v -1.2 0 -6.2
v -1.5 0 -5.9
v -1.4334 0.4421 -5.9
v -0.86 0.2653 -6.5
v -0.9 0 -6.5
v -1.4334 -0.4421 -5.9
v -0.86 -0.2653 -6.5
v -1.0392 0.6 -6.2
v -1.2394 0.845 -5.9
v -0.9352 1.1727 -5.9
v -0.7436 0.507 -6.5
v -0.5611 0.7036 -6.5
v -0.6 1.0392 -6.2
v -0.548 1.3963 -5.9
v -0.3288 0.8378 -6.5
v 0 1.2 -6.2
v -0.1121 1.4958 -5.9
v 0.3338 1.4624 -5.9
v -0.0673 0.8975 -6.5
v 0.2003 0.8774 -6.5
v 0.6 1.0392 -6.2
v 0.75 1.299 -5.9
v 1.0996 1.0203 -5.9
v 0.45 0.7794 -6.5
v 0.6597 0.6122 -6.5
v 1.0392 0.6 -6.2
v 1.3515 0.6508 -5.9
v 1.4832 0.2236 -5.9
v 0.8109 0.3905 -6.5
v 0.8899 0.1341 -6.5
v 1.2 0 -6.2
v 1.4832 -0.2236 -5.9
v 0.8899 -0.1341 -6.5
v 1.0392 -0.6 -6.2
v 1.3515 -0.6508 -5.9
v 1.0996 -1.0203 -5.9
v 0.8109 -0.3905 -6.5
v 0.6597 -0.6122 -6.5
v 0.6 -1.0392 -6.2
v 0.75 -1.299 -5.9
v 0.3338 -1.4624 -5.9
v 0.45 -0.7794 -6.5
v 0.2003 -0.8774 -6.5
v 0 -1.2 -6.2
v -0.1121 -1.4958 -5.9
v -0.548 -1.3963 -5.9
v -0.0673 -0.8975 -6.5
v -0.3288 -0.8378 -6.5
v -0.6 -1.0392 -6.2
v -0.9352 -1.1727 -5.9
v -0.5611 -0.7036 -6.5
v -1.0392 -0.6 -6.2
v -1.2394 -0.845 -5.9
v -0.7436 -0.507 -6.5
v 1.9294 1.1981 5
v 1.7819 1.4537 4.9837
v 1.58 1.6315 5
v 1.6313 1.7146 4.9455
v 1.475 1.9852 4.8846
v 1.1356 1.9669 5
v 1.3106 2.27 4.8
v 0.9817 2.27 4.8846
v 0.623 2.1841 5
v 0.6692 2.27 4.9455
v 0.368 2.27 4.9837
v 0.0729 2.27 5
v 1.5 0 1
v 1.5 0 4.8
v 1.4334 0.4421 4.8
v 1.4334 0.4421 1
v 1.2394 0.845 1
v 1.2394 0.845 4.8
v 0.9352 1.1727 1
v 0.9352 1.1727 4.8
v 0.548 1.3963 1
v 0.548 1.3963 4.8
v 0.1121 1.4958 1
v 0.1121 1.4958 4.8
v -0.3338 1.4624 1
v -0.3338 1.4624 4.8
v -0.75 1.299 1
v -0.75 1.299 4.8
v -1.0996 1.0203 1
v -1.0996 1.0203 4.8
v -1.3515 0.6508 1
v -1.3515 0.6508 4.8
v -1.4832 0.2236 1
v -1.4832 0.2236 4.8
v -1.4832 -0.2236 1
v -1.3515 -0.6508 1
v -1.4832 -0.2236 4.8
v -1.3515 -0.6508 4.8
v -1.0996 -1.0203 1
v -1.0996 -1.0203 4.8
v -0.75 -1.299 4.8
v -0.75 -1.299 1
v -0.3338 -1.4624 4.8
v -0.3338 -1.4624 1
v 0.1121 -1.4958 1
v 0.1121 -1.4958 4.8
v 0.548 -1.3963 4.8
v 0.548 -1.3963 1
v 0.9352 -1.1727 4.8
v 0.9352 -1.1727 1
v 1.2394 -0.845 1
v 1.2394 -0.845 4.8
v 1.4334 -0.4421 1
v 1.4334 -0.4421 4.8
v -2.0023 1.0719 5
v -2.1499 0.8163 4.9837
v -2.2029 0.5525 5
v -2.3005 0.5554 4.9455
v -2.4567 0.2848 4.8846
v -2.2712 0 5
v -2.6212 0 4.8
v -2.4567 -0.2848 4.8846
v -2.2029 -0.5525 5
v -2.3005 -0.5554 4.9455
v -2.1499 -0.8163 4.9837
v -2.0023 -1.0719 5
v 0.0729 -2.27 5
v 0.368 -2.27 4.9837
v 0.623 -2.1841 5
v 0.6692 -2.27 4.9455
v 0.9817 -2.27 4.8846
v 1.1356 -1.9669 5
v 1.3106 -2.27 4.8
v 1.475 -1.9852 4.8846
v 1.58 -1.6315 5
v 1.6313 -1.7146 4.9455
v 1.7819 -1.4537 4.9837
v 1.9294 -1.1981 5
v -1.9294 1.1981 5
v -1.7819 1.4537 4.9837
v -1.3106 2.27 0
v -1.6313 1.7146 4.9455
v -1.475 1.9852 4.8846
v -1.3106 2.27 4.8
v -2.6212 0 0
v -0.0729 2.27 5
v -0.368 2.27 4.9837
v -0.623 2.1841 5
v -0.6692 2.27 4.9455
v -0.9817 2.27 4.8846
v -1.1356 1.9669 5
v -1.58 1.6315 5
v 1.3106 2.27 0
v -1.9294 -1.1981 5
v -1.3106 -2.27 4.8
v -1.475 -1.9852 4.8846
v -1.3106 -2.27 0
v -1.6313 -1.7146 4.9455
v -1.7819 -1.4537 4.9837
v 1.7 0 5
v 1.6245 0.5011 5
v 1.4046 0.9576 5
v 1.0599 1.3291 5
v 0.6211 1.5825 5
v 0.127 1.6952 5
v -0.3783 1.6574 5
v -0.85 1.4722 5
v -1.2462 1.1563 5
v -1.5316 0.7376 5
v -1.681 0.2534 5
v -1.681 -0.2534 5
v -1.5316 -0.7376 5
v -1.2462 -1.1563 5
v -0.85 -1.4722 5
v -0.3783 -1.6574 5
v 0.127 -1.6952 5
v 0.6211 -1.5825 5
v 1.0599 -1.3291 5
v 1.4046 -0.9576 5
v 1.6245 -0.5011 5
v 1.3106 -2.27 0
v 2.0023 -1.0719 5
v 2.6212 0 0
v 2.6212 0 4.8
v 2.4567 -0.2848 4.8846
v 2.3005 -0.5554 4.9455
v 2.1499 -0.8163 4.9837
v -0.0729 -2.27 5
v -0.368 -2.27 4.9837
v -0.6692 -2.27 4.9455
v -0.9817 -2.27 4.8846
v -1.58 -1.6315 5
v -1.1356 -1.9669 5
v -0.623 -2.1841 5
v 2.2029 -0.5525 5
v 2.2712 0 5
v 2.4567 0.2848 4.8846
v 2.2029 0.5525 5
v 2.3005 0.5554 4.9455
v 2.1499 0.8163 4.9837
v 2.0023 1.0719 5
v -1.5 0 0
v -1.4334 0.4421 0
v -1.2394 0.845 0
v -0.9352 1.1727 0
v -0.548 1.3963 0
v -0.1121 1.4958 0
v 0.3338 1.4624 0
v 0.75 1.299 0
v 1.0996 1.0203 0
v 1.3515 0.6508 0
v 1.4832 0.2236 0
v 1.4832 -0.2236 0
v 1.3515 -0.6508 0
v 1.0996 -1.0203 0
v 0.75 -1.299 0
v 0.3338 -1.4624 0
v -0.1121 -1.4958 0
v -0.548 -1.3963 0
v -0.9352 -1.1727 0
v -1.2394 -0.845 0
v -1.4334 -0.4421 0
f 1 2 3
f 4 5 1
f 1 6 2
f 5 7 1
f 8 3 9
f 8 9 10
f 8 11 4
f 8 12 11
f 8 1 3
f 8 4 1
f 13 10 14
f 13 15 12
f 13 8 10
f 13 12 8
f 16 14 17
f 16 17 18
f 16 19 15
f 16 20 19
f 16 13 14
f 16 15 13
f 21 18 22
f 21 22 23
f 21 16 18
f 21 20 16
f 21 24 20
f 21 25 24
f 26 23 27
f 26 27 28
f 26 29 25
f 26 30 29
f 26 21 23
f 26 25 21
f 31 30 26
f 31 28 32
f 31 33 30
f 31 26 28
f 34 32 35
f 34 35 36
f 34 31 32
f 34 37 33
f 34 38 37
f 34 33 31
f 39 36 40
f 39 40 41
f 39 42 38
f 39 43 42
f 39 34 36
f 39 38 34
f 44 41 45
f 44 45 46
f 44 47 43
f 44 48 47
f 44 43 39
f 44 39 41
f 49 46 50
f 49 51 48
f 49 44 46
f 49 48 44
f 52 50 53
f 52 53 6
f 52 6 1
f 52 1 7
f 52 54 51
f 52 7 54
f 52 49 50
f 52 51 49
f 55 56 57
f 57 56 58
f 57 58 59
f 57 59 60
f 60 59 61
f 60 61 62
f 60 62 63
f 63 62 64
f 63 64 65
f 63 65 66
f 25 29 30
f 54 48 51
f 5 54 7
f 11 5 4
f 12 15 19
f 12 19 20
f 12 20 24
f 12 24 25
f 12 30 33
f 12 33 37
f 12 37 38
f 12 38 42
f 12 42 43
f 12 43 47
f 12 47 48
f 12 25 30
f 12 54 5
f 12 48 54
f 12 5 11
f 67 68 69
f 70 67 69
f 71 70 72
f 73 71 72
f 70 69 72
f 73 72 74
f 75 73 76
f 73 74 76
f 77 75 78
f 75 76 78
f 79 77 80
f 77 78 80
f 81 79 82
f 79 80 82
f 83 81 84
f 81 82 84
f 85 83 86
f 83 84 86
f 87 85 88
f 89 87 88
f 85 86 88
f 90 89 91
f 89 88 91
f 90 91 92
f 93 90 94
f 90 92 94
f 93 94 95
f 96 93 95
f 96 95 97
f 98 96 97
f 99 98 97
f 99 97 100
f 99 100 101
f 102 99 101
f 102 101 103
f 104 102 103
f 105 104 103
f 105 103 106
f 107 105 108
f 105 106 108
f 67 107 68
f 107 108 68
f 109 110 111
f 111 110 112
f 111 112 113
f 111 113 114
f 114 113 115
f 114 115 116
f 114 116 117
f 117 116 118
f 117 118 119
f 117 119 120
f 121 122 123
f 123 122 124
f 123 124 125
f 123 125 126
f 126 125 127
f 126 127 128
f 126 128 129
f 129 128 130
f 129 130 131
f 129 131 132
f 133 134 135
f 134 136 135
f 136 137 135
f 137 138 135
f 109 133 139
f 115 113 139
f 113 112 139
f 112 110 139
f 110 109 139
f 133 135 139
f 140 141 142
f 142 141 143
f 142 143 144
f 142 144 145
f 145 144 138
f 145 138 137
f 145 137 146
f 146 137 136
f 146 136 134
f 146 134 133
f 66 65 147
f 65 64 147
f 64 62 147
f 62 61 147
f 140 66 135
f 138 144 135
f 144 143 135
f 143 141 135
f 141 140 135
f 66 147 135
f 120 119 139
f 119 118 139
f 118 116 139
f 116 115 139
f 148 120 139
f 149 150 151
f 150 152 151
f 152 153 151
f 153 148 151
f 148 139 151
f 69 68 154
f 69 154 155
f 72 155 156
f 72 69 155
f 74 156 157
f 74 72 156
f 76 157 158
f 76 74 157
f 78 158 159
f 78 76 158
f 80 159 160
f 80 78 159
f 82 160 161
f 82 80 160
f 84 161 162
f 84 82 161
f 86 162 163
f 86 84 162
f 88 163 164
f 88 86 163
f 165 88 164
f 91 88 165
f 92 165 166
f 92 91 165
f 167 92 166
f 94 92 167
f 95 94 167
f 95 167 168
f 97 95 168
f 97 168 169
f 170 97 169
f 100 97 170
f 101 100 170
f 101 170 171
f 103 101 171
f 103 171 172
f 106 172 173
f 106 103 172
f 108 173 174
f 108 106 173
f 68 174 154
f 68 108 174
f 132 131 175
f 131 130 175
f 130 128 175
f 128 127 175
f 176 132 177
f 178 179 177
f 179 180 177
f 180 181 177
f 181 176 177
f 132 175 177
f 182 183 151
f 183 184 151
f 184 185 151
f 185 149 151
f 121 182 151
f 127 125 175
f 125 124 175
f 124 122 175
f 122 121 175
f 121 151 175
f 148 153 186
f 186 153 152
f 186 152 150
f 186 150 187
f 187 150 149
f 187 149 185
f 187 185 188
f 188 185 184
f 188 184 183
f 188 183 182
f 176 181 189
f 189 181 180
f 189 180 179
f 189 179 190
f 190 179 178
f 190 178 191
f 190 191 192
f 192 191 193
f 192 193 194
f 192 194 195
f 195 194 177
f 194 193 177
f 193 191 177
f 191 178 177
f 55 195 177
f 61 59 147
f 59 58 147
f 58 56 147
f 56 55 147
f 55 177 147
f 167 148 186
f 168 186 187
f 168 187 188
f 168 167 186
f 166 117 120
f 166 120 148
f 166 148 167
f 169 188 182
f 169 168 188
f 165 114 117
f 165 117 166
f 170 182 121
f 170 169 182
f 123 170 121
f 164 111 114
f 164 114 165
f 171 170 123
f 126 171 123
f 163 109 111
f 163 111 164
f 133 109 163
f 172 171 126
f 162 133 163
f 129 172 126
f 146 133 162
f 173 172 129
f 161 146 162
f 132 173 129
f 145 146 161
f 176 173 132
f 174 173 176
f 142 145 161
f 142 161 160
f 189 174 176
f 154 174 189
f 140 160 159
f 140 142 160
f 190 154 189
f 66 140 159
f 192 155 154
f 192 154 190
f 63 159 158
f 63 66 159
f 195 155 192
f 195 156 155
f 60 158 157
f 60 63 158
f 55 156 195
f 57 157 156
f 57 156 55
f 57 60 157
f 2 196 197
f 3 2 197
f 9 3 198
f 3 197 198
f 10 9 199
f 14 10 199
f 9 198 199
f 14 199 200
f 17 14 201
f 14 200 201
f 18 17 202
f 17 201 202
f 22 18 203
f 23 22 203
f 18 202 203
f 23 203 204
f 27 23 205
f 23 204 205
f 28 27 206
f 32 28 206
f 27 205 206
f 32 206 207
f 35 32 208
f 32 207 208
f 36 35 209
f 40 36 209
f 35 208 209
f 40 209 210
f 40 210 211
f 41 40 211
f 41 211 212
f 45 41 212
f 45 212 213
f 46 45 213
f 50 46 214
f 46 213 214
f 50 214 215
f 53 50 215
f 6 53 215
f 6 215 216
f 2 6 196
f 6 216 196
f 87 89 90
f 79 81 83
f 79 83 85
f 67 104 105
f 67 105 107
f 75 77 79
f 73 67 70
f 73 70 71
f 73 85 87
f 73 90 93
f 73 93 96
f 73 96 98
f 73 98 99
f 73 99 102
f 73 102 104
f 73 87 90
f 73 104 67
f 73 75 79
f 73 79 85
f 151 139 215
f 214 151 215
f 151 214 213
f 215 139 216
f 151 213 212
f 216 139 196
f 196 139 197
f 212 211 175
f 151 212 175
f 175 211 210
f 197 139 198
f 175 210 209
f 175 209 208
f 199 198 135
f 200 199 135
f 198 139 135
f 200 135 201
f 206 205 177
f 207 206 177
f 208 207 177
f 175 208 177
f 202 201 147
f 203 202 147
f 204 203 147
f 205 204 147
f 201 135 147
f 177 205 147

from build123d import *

# Parameters (mm, degrees)
BOSS_EXTRUDE1_DEPTH     = 5
SKETCH2_R               = 1.5
CUT_EXTRUDE1_DEPTH      = 1
CUT_EXTRUDE1_DEPTH_BACK = 4
CHAMFER1_SIZE           = 0.2
SKETCH4_R               = 1.5
BOSS_EXTRUDE2_DEPTH     = 6.5
CHAMFER2_SIZE           = 0.6


with BuildPart() as part:
    # Sketch1 → Boss-Extrude1 (new body)
    with BuildSketch(Plane.XY):
        Polygon((2.621170222, 0), (1.310585111, 2.27), (-1.310585111, 2.27), (-2.621170222, 0), (-1.310585111, -2.27), (1.310585111, -2.27), align=None)
    extrude(amount=BOSS_EXTRUDE1_DEPTH)

    # Sketch2 → Cut-Extrude1 (cut, two sides)
    with BuildSketch(Plane.XY.offset(5)) as cut_extrude1_sk:
        Circle(SKETCH2_R)
    extrude(amount=CUT_EXTRUDE1_DEPTH, mode=Mode.SUBTRACT)
    extrude(cut_extrude1_sk.sketch, amount=-CUT_EXTRUDE1_DEPTH_BACK, mode=Mode.SUBTRACT)

    # Sketch3 → Cut-Revolve1 (revolve, cut)
    with BuildSketch(Plane(origin=(0, 0, 0), x_dir=(1, 0, 0), z_dir=(0, 1, 0))):
        Polygon((-2.621170222, -5), (-2.271170222, -5), (-2.621170222, -4.8), align=None)
    revolve(axis=Axis((0, 0, 1), (0, 0, 1)), mode=Mode.SUBTRACT)

    # Chamfer1
    chamfer1_edges = [part.edges().sort_by_distance(p)[0] for p in [
        (-1.5, 0, 5),
    ]]
    chamfer(chamfer1_edges, length=CHAMFER1_SIZE)

    # Sketch4 → Boss-Extrude2 (add)
    with BuildSketch(Plane(origin=(0, 0, 0), x_dir=(-1, 0, 0), z_dir=(0, 0, -1))):
        Circle(SKETCH4_R)
    extrude(amount=BOSS_EXTRUDE2_DEPTH)

    # Chamfer2
    chamfer2_edges = [part.edges().sort_by_distance(p)[0] for p in [
        (1.5, 0, -6.5),
    ]]
    chamfer(chamfer2_edges, length=CHAMFER2_SIZE)


solid = part.part
